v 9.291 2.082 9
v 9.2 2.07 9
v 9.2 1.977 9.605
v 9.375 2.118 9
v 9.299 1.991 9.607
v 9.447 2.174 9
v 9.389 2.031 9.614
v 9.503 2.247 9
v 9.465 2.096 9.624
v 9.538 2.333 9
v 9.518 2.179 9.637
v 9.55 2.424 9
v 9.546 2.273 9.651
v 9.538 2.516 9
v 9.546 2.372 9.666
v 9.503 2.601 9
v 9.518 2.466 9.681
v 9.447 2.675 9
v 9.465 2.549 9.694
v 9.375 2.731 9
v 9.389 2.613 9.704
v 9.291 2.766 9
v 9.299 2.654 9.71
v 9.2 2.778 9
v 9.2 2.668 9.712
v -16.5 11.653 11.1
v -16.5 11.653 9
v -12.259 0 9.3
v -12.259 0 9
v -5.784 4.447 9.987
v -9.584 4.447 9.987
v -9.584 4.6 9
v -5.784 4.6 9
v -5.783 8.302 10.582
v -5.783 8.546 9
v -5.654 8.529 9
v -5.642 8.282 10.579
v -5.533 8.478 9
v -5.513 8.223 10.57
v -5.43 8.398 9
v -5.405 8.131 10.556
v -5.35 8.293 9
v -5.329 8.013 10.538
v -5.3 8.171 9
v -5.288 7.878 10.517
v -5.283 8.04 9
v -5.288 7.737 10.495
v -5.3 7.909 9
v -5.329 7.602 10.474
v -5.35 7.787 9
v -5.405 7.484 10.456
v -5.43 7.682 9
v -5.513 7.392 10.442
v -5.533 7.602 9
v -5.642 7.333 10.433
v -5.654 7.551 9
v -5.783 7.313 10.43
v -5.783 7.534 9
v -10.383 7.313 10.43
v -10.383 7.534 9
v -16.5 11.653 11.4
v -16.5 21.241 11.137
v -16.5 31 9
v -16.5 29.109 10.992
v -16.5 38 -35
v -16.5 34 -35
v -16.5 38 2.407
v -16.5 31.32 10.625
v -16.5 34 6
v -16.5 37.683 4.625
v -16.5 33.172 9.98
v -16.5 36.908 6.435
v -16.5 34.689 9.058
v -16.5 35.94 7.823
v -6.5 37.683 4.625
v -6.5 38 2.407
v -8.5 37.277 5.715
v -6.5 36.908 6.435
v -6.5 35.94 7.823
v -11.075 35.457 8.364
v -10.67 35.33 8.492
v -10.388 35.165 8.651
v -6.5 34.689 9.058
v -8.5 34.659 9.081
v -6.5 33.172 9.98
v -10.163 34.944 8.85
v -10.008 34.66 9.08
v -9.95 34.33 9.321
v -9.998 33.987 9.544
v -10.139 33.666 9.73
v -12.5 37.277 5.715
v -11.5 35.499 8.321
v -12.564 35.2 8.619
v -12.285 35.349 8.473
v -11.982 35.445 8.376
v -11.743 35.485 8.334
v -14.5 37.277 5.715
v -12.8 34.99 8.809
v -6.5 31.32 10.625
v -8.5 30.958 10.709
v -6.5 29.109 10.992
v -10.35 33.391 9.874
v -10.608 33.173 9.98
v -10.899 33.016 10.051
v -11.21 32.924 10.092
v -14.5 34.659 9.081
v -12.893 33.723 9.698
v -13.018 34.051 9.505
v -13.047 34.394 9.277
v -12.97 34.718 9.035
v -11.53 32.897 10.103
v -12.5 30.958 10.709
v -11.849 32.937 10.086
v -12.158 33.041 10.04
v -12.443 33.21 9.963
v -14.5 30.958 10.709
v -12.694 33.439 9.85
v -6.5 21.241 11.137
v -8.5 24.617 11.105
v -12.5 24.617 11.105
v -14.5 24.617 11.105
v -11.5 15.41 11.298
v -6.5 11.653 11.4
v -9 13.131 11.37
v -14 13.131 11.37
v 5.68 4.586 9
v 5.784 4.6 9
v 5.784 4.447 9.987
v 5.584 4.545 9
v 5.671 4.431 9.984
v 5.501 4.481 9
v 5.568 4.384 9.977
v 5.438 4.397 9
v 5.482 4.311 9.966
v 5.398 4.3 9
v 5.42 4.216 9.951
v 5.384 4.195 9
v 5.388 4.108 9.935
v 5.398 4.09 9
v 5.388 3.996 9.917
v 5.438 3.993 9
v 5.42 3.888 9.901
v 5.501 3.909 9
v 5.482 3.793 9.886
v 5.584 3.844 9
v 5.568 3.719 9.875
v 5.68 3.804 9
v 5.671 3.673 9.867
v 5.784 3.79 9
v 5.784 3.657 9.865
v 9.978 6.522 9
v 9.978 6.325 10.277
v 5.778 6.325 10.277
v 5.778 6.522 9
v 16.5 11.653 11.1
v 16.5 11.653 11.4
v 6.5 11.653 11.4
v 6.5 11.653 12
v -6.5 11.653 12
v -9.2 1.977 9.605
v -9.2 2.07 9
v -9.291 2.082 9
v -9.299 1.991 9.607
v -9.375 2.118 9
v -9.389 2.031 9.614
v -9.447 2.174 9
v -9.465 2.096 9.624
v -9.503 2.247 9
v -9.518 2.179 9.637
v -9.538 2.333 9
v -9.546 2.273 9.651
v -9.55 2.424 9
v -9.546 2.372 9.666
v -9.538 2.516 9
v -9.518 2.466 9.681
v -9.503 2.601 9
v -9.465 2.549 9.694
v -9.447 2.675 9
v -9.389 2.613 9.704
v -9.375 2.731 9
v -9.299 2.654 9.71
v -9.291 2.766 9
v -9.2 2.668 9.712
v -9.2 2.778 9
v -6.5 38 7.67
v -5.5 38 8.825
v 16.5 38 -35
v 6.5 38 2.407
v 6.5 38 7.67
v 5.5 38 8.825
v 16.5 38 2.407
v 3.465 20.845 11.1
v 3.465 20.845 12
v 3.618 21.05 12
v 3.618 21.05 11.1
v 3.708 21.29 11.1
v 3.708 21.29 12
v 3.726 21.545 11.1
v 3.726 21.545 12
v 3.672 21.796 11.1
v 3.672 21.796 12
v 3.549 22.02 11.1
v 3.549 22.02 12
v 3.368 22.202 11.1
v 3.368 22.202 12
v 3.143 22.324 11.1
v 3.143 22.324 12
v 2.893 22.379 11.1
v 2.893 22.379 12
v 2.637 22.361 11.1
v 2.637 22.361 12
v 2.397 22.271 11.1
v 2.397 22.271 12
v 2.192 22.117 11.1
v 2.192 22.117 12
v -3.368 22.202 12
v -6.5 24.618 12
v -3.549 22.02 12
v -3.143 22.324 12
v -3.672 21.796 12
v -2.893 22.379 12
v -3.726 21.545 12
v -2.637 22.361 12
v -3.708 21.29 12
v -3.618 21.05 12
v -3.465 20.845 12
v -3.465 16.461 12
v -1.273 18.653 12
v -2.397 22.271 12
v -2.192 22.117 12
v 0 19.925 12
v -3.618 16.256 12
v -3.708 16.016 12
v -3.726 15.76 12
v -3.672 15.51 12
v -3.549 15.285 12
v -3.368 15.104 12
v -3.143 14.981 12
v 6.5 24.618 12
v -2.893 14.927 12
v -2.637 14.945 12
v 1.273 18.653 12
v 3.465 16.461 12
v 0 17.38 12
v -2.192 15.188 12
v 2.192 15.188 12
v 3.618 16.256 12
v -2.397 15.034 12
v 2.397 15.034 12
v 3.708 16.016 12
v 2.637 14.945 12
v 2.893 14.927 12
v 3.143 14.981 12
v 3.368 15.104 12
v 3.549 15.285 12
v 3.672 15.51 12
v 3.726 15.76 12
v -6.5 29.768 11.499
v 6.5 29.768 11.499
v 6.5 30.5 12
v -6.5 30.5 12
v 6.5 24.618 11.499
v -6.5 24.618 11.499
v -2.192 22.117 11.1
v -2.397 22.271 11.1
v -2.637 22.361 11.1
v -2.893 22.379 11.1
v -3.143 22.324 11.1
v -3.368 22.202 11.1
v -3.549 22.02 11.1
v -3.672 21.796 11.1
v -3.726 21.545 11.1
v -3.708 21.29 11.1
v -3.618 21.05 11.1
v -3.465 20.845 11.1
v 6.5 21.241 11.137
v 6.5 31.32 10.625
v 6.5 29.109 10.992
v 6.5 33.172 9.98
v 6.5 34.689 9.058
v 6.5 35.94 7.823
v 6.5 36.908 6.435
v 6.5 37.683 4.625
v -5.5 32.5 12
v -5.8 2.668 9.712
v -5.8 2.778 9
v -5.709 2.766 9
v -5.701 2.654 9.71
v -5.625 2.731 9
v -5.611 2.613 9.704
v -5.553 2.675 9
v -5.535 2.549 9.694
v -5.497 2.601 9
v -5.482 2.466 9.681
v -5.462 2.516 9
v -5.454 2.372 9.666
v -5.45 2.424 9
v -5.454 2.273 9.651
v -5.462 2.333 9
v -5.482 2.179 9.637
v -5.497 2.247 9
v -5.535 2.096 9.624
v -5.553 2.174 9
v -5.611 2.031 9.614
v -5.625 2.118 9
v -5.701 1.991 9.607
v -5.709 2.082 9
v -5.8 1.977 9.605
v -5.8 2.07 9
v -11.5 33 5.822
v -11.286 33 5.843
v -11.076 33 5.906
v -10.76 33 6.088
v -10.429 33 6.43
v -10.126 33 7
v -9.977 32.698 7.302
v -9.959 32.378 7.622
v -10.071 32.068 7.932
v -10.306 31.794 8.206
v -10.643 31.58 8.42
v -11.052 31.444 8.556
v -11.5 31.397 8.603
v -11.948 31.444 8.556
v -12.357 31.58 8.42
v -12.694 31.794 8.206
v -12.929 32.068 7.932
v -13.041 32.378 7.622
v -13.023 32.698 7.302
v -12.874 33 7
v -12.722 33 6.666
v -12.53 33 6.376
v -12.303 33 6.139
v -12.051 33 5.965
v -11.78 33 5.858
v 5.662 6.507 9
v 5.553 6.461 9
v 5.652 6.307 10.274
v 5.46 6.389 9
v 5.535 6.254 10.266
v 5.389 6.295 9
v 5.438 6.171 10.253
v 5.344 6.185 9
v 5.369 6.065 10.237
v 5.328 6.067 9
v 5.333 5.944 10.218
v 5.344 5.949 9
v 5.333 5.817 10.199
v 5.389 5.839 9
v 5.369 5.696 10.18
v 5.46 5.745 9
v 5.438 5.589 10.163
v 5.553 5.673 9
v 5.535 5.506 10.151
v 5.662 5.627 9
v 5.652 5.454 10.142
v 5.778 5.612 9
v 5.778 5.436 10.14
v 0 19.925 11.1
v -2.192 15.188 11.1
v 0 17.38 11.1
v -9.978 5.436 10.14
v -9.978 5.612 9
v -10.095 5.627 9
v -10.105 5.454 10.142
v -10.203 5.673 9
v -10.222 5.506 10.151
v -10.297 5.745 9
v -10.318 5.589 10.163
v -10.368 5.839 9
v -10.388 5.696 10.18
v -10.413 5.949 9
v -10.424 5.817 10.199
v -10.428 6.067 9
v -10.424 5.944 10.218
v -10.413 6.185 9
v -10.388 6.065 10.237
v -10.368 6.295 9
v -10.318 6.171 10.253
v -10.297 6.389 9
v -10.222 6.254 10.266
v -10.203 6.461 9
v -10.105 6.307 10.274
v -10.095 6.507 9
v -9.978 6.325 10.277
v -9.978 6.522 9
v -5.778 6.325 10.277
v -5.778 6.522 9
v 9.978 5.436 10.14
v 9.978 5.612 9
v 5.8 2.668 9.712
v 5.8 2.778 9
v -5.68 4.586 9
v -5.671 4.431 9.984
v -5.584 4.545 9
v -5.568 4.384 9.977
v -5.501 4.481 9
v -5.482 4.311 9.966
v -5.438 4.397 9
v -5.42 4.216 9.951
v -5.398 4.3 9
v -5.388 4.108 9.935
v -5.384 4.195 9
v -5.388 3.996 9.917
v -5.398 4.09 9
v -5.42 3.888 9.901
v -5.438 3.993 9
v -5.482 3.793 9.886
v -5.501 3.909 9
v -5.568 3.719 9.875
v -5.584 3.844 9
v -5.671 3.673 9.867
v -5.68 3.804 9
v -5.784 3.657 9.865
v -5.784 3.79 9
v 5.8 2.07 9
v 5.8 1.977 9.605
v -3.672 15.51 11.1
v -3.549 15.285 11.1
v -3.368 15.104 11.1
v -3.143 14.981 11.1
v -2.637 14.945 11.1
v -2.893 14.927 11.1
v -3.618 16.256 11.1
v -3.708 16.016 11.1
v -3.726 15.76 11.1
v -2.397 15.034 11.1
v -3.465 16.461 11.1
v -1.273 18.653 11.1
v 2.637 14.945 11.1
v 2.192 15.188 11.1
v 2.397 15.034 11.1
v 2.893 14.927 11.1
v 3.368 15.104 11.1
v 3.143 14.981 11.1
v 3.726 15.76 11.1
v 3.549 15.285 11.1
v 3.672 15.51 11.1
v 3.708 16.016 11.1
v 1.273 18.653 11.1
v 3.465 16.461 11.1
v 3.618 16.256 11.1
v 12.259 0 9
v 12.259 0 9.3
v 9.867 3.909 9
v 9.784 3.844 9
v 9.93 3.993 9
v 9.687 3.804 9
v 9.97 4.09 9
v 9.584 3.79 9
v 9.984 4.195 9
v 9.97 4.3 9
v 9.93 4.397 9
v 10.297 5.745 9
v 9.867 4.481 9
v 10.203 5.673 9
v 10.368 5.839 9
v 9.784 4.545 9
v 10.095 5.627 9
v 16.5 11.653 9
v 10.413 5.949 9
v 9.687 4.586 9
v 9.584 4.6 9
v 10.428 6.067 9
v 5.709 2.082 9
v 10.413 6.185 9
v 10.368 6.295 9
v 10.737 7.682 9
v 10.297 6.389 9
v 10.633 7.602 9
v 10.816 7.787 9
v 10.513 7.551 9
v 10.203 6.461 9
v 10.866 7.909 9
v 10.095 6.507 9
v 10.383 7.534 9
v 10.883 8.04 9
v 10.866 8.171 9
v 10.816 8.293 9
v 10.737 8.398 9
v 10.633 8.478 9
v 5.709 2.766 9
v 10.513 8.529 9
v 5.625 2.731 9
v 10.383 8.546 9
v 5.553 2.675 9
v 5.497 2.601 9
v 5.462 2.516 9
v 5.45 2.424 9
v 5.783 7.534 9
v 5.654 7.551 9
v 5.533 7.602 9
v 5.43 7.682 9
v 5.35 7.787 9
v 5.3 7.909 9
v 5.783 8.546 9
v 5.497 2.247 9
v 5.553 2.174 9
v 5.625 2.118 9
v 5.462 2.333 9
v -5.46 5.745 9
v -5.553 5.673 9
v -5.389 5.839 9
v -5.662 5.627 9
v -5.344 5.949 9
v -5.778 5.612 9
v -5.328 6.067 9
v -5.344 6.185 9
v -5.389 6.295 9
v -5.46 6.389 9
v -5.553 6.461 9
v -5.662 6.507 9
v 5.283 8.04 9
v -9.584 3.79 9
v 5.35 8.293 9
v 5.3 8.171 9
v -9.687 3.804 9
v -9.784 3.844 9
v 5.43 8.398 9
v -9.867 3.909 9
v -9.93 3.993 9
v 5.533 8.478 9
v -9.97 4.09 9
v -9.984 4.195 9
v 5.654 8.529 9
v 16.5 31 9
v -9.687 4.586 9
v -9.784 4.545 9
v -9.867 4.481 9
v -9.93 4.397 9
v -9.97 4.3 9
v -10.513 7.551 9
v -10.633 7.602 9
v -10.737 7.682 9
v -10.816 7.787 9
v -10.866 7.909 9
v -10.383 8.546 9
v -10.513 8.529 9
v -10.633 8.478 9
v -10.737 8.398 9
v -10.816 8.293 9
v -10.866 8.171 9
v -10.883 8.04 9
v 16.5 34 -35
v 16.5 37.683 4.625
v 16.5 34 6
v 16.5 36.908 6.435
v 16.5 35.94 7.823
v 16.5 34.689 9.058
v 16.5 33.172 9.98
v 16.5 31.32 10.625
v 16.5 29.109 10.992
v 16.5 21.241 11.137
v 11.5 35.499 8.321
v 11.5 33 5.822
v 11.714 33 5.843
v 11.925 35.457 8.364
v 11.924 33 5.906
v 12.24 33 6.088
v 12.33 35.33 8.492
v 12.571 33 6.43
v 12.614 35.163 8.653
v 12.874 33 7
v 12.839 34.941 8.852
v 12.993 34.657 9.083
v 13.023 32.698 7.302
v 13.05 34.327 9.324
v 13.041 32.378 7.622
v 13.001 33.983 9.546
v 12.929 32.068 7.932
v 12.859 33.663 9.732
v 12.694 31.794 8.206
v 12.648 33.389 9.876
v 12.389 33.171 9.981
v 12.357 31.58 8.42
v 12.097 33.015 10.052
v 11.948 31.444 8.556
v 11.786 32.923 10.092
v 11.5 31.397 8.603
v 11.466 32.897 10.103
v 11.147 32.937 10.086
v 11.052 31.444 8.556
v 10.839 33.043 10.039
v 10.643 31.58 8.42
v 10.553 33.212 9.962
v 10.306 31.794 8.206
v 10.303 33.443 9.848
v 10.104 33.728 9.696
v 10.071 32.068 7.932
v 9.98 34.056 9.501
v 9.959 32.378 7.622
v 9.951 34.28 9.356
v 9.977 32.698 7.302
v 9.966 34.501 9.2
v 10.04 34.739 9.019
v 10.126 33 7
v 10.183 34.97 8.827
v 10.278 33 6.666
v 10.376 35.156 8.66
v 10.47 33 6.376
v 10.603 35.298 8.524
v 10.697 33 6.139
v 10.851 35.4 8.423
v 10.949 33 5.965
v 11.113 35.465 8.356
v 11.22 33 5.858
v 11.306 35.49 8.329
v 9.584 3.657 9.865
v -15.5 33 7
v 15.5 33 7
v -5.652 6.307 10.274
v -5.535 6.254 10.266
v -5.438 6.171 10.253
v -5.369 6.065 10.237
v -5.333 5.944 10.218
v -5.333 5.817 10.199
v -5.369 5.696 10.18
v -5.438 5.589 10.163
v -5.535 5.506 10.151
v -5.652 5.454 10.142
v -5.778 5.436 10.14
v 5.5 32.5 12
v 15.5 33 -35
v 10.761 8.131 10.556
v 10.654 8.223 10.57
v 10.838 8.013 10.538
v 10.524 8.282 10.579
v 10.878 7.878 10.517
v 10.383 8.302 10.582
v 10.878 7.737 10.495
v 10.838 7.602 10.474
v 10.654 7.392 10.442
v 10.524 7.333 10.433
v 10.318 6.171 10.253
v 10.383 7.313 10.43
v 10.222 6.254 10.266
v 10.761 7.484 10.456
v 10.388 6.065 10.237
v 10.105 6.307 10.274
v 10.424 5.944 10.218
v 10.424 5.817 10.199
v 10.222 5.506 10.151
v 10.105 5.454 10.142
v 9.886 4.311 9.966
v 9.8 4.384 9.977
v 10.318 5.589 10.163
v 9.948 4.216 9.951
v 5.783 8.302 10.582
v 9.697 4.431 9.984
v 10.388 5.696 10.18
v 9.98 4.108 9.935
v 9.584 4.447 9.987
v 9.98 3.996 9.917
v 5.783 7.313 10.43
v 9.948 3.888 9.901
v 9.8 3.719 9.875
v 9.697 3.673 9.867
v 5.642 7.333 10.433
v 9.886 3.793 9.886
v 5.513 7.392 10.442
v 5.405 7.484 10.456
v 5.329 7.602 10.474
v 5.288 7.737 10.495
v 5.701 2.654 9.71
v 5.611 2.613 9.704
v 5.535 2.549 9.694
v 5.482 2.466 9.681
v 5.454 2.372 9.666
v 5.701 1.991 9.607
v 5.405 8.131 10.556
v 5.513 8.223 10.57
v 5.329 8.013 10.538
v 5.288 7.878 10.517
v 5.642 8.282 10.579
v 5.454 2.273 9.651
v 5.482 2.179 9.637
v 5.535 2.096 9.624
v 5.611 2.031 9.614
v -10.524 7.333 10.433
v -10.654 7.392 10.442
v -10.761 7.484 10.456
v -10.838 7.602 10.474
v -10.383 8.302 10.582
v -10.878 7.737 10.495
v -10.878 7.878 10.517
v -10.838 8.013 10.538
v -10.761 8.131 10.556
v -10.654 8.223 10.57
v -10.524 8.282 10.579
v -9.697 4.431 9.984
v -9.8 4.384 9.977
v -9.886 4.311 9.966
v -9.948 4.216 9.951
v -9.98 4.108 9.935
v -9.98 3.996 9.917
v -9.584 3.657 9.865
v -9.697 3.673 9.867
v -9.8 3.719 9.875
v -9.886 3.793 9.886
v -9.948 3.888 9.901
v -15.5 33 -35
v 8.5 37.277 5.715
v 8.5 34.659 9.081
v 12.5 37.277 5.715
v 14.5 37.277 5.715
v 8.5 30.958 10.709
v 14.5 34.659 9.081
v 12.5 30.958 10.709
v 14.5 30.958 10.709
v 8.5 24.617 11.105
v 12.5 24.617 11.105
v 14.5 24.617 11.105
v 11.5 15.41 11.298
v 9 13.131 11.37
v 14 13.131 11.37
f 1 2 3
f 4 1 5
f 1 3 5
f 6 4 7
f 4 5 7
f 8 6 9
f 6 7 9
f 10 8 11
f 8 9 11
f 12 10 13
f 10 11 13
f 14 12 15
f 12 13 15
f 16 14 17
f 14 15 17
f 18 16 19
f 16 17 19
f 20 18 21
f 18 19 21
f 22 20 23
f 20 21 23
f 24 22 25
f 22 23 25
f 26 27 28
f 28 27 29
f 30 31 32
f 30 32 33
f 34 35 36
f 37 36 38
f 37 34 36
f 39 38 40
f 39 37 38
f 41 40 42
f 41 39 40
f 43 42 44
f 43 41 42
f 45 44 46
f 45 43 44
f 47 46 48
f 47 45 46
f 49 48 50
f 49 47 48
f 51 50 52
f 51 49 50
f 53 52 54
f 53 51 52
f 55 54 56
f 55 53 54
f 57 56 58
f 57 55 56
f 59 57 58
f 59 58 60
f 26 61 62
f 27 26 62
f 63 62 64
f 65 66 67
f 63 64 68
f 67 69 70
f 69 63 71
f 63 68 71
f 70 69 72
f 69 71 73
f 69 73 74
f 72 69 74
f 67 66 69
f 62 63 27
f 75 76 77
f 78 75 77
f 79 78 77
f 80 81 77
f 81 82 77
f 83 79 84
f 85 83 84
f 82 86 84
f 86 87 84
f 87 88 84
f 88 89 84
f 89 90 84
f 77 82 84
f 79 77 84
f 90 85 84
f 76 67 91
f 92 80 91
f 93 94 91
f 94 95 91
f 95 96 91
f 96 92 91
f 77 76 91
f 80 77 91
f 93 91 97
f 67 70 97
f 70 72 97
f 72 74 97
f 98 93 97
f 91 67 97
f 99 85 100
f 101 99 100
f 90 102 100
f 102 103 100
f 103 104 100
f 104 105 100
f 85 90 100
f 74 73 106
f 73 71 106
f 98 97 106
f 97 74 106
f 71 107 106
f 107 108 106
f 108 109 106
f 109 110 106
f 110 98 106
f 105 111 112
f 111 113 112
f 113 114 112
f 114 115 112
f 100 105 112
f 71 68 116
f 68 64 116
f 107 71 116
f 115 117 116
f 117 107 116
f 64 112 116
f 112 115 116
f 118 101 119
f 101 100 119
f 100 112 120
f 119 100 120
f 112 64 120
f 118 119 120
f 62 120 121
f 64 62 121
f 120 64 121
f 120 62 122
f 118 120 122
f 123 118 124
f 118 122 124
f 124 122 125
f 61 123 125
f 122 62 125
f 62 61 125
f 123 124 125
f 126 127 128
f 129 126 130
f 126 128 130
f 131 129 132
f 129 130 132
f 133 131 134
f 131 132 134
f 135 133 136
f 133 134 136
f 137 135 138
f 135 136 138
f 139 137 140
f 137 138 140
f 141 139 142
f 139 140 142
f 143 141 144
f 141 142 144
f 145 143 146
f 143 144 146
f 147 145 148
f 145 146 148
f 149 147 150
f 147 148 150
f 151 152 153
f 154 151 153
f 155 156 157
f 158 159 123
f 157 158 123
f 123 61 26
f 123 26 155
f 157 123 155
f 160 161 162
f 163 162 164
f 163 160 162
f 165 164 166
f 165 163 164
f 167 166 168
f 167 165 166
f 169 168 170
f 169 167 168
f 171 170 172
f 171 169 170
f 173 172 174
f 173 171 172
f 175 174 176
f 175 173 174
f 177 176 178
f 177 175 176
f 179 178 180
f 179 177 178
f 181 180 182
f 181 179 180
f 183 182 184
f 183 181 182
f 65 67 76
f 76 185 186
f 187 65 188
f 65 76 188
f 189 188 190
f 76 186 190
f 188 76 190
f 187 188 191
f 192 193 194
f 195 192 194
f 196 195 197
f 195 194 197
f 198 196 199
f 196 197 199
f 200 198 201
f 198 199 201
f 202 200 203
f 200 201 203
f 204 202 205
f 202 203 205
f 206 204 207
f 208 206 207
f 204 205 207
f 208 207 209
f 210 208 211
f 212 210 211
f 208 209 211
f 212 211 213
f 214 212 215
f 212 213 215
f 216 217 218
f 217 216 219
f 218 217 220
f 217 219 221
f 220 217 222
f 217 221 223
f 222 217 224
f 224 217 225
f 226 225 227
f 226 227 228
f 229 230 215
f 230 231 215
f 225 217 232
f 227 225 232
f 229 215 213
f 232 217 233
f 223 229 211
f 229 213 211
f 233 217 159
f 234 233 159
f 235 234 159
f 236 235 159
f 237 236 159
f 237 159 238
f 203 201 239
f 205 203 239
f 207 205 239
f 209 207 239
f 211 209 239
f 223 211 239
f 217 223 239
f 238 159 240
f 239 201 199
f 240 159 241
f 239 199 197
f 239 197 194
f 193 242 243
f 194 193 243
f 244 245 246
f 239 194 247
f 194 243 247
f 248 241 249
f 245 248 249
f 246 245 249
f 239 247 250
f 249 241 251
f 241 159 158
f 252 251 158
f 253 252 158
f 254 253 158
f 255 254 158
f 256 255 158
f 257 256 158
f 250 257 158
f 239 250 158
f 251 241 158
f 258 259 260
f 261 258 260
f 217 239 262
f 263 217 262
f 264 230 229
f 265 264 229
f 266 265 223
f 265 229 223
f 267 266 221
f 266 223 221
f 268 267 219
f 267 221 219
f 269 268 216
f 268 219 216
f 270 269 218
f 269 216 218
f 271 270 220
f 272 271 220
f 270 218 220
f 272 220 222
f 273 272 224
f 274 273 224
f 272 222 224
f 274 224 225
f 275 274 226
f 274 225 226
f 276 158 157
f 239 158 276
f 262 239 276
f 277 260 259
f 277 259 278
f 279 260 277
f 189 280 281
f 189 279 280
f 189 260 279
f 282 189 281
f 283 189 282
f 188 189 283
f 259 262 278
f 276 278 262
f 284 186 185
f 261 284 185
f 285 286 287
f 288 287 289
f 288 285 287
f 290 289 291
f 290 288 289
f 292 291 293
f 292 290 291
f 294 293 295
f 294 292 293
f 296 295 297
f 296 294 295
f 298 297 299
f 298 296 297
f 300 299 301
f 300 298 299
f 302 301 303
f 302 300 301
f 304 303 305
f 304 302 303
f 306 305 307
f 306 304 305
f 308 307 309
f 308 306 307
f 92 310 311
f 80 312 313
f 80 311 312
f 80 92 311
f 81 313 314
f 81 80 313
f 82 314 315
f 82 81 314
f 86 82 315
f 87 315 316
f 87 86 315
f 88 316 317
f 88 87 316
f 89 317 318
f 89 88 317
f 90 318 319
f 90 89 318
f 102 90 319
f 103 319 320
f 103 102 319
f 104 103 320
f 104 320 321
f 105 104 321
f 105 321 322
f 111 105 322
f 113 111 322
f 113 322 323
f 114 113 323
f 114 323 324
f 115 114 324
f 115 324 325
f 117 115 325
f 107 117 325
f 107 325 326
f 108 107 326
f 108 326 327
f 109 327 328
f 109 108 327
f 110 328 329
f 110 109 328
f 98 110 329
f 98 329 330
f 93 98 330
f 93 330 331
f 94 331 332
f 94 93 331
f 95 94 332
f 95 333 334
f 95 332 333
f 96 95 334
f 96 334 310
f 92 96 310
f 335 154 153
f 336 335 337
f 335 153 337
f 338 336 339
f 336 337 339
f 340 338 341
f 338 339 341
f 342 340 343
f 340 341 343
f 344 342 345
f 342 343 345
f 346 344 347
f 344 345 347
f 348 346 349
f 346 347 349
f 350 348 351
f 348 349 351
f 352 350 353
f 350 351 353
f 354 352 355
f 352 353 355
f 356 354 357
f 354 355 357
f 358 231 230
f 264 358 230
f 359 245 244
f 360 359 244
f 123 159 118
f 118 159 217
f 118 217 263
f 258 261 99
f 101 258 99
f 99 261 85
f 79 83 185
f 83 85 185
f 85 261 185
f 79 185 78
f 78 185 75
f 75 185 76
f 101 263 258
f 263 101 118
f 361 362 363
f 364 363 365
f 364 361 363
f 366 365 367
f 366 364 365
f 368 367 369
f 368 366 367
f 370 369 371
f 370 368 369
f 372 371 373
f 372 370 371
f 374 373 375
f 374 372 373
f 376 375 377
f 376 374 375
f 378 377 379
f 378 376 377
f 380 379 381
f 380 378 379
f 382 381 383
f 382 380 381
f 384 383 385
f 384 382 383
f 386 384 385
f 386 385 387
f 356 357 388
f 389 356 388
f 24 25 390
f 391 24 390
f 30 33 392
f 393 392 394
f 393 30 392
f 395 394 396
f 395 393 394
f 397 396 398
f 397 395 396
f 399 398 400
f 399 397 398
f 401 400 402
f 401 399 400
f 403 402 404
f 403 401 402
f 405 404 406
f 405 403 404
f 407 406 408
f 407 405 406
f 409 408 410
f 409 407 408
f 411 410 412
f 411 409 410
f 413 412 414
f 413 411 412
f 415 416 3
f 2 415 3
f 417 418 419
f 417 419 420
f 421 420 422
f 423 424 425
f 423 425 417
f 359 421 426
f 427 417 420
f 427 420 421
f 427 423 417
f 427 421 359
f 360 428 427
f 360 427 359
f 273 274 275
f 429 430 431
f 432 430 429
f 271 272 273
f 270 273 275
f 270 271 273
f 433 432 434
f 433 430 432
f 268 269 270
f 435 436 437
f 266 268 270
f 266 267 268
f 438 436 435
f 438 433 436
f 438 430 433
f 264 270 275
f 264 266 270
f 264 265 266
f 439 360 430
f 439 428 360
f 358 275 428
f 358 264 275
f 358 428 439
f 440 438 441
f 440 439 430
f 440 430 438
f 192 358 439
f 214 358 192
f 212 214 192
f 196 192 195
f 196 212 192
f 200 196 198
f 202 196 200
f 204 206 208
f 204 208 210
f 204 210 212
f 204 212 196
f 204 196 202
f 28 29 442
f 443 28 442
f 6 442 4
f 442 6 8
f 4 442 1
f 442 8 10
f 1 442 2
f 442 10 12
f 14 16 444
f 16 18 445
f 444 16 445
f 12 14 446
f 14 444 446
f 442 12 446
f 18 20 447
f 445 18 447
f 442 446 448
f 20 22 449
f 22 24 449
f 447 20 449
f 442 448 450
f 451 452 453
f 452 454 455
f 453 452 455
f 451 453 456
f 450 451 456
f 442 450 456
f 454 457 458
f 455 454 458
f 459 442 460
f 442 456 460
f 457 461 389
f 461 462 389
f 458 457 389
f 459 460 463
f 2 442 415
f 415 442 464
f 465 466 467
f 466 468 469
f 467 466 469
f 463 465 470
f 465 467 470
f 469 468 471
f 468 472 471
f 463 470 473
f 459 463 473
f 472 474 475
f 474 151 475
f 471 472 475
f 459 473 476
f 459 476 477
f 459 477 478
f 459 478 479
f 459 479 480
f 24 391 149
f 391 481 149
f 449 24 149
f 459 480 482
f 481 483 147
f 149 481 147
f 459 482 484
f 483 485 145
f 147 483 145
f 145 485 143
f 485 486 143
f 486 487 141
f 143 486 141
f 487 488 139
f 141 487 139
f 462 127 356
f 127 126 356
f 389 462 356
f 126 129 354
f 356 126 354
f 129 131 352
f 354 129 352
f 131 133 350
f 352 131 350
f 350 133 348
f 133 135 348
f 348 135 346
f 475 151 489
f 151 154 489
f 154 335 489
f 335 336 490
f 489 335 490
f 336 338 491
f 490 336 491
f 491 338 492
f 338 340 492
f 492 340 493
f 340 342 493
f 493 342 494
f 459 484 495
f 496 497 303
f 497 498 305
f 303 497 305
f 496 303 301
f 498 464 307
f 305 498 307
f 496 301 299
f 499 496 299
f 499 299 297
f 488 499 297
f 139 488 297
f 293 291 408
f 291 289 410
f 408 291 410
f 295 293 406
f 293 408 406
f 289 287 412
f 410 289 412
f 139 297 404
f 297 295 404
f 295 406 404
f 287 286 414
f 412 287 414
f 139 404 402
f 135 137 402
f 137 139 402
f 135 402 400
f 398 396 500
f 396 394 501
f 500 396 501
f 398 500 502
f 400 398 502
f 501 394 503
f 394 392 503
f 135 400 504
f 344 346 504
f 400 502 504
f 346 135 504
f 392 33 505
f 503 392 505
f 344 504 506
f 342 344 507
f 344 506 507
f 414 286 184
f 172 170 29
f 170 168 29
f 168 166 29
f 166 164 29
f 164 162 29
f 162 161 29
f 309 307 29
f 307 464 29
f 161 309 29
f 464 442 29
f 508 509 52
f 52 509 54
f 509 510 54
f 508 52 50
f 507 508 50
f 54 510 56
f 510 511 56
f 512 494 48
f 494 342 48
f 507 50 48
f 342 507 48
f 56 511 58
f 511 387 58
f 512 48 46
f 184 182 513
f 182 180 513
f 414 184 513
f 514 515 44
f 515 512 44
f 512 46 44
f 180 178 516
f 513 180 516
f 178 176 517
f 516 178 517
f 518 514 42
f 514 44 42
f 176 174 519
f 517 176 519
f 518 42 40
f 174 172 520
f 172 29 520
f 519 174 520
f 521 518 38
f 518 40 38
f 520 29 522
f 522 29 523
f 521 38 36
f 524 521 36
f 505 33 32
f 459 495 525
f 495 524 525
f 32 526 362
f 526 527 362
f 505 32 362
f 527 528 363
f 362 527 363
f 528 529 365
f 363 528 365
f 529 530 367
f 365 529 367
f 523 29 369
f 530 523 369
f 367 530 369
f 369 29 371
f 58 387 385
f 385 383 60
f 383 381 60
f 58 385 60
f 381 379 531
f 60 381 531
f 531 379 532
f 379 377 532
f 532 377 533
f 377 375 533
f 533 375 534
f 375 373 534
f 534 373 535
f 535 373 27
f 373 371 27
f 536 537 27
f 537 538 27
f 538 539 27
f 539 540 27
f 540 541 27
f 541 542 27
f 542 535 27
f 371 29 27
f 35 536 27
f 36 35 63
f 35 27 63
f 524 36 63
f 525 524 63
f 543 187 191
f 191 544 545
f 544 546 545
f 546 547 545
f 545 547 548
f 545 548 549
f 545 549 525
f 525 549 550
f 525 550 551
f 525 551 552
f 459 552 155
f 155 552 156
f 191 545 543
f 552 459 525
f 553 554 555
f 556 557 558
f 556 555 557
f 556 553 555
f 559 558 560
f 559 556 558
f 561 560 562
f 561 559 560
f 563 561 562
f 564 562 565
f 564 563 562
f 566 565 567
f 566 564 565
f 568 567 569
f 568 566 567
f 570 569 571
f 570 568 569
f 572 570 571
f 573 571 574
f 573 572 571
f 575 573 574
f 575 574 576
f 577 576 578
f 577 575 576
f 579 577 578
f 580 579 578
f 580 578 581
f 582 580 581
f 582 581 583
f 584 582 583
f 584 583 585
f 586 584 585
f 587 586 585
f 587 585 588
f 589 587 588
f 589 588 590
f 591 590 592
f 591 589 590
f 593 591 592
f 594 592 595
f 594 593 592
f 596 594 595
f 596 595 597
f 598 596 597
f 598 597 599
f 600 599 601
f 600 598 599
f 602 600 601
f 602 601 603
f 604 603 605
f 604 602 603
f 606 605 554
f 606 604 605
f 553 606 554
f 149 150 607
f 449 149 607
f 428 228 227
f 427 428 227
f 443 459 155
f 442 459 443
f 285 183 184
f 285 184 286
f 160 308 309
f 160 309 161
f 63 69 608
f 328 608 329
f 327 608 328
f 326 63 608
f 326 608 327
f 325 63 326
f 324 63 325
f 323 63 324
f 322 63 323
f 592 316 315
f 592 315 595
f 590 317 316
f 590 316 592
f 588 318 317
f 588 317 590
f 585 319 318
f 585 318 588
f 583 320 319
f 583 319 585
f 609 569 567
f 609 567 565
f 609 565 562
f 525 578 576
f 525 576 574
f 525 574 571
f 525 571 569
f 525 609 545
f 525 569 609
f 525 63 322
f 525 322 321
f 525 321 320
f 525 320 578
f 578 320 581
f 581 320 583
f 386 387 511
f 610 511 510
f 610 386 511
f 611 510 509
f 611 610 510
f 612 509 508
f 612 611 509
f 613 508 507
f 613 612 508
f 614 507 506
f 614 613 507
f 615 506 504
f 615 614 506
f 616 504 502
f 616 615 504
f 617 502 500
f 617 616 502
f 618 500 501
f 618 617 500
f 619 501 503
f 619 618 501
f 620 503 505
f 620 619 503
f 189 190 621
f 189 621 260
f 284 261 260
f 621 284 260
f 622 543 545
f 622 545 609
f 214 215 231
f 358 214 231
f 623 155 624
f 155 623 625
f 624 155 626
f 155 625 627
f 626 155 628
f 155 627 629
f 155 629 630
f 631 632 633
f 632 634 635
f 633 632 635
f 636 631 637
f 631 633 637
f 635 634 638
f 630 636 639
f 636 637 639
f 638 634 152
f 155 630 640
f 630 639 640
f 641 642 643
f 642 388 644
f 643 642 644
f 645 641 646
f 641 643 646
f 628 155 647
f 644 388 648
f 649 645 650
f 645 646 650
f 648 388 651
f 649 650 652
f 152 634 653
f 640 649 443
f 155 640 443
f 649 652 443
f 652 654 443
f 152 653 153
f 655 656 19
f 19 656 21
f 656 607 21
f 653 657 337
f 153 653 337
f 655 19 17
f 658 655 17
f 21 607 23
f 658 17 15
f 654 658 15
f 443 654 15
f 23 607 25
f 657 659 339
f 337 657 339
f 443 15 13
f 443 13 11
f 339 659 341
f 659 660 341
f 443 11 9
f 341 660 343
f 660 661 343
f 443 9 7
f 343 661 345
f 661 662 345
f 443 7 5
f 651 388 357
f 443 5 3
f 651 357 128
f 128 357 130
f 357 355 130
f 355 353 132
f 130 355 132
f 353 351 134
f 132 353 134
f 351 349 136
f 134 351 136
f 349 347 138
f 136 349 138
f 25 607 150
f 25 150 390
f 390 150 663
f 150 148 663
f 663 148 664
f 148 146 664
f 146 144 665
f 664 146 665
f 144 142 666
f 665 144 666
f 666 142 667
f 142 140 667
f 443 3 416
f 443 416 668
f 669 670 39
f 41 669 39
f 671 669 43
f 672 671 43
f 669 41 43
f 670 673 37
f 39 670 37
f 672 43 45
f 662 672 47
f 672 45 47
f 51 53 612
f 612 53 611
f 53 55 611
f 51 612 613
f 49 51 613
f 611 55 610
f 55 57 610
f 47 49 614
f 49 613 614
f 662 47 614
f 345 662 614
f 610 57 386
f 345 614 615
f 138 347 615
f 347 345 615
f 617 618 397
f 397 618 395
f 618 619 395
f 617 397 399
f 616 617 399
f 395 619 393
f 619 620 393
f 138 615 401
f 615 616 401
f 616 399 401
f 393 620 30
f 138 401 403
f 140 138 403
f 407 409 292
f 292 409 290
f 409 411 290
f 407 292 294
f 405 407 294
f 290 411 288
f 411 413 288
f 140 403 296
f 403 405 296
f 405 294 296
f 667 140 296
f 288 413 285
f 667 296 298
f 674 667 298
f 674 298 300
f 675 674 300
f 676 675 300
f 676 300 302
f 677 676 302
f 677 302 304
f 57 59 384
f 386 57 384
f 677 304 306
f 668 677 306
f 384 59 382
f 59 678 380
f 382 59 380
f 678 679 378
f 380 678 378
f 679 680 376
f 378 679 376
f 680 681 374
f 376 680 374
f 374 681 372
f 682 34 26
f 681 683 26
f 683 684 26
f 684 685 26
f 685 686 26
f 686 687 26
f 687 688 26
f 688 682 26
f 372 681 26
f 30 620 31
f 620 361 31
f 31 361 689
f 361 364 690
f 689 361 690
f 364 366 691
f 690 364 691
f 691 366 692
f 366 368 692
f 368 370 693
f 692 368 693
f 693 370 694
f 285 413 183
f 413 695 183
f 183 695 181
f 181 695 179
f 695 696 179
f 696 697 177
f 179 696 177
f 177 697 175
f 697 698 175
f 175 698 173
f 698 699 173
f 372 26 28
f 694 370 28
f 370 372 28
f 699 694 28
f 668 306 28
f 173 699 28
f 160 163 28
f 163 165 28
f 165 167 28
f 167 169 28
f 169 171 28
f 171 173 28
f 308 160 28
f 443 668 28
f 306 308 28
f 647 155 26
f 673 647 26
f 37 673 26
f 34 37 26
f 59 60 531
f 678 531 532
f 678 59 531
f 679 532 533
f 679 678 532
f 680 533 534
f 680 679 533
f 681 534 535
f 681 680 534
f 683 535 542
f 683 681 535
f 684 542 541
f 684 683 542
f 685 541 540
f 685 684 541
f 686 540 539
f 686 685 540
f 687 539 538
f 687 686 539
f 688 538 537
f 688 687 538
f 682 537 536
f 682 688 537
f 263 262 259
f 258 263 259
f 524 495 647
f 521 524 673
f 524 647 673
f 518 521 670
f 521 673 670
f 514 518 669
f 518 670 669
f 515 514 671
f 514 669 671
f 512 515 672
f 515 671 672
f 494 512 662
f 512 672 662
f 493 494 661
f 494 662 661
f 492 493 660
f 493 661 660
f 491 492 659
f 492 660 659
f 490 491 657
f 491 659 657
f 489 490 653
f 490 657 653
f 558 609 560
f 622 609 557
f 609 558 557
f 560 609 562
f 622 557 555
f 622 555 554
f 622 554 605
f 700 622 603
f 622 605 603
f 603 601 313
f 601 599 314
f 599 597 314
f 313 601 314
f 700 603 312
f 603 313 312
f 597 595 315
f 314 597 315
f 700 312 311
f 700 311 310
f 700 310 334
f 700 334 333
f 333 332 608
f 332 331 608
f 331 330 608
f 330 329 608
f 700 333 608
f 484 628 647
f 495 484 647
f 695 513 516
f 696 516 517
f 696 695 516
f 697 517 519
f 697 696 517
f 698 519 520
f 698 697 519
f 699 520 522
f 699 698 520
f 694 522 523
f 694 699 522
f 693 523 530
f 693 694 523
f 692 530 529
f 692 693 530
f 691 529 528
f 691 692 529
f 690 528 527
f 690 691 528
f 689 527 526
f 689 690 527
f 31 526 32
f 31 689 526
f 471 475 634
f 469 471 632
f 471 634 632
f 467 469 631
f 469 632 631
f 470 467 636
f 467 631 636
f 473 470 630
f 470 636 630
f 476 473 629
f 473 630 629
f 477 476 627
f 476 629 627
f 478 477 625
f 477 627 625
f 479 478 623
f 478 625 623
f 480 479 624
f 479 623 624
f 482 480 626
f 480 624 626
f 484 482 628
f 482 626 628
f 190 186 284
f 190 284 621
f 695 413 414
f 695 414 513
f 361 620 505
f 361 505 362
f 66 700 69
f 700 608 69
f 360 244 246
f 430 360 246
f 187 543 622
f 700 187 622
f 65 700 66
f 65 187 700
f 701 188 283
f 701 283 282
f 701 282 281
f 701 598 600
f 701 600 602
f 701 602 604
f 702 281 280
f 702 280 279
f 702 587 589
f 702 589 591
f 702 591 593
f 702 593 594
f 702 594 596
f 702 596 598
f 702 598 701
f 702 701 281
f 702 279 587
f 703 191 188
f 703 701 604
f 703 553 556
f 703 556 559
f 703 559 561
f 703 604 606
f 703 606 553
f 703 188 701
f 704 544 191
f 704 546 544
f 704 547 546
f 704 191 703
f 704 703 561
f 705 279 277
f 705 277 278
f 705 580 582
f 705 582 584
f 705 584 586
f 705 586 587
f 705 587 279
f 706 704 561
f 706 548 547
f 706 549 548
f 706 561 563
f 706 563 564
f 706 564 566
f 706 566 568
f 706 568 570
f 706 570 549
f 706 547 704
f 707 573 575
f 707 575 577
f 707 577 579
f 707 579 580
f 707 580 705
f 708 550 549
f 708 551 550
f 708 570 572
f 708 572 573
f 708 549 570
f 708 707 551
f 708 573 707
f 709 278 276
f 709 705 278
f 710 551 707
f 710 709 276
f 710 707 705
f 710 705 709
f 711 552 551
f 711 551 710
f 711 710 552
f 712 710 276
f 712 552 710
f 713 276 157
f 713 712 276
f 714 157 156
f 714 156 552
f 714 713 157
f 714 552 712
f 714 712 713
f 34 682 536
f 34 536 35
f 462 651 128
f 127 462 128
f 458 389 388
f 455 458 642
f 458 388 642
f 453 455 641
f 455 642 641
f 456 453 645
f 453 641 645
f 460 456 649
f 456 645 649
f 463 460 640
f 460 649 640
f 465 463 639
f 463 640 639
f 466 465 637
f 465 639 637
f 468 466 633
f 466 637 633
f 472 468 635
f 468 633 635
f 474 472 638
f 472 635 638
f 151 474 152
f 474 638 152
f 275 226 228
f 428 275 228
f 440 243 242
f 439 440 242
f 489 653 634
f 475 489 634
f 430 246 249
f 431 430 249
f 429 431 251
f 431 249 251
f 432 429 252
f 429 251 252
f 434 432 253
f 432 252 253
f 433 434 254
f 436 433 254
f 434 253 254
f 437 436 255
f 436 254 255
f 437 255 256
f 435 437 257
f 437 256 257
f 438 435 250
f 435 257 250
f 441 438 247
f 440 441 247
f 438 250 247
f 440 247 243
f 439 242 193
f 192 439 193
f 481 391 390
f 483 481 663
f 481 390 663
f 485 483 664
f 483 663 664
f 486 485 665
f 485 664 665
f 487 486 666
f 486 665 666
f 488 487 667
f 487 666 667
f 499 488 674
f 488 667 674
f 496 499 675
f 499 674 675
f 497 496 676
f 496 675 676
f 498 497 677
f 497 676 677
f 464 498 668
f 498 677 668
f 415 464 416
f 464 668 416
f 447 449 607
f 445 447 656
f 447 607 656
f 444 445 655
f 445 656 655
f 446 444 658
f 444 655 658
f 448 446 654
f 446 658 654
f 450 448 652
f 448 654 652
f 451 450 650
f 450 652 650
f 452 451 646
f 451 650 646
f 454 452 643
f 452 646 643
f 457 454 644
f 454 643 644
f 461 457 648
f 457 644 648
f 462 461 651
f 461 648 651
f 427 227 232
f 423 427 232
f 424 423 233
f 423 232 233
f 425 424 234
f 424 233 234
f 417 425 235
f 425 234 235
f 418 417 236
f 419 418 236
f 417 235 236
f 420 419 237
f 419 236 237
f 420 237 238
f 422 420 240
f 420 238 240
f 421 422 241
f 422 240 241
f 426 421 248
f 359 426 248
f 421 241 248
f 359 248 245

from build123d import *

# Parameters (mm, degrees)
SKETCH_1_W                = 33
SKETCH_1_H                = 24
EXTRUDE_1_DEPTH           = 38
SKETCH_2_W                = 21
SKETCH_2_H                = 33
CUT_EXTRUDE_1_DEPTH       = 35
CHAMFER_1_SIZE            = 5.5
CHAMFER_1_SIZE2           = 3.175426481
CHAMFER_2_SIZE            = 2
CHAMFER_3_SIZE            = 1
CUT_EXTRUDE_2_DEPTH       = 35
CUT_EXTRUDE_3_DEPTH       = 10
CUT_EXTRUDE_4_DEPTH       = 47.446205605
EXTRUDE_4_DEPTH           = 23
CHAMFER_4_SIZE            = 1
CUT_EXTRUDE_5_DEPTH       = 62.385572206
CUT_EXTRUDE_6_DEPTH       = 0.9
CUT_EXTRUDE_10_DEPTH      = 57.550862232
CUT_EXTRUDE_11_DEPTH      = 61.805016358
CUT_EXTRUDE_11_DEPTH_BACK = 61.805016358
SKETCH_11_R               = 1.55


with BuildPart() as part:
    # 草图1 → 凸台-拉伸1 (new body)
    with BuildSketch(Plane(origin=(0, 0, 0), x_dir=(1, 0, 0), z_dir=(0, 1, 0))):
        Rectangle(SKETCH_1_W, SKETCH_1_H)
    extrude(amount=EXTRUDE_1_DEPTH)

    # 草图2 → 切除-拉伸1 (cut)
    with BuildSketch(Plane.ZY.offset(16.5)):
        with Locations((-1.5, 16.5)):
            Rectangle(SKETCH_2_W, SKETCH_2_H)
    extrude(amount=-CUT_EXTRUDE_1_DEPTH, mode=Mode.SUBTRACT)

    # 倒角1
    chamfer_1_edges = [part.edges().sort_by_distance(p)[0] for p in [
        (0, 38, 12),
    ]]
    chamfer_1_side = [part.faces().sort_by_distance(p)[0] for p in [
        (0, 19, 12),
    ]]
    chamfer(chamfer_1_edges, length=CHAMFER_1_SIZE, length2=CHAMFER_1_SIZE2, reference=chamfer_1_side[0])

    # 倒角2
    chamfer_2_edges = [part.edges().sort_by_distance(p)[0] for p in [
        (0, 33, 9),
    ]]
    chamfer(chamfer_2_edges, length=CHAMFER_2_SIZE)

    # 倒角3
    chamfer_3_edges = [part.edges().sort_by_distance(p)[0] for p in [
        (-16.5, 33, -2.5),
        (16.5, 33, -2.5),
    ]]
    chamfer(chamfer_3_edges, length=CHAMFER_3_SIZE)

    # 草图3 → 切除-拉伸2 (cut)
    with BuildSketch(Plane.ZY.offset(16.5)):
        Polygon((12, 11.65264418), (11.1, 11.65264418), (9.3, 0), (12, 0), align=None)
    extrude(amount=-CUT_EXTRUDE_2_DEPTH, mode=Mode.SUBTRACT)

    # 草图4 → 切除-拉伸3 (cut)
    with BuildSketch(Plane.ZY.offset(16.5)):
        with BuildLine():
            Line((2.407420419, 38), (8.824573519, 38))
            Line((8.824573519, 38), (12, 32.5))
            Line((12, 32.5), (12, 11.65264418))
            Line((12, 11.65264418), (11.4, 11.65264418))
            add(Edge.make_bspline(
                [(2.407420419, 38), (4.944551671, 38), (7.556679946, 36.344258823), (10.730064424, 32.982057859), (11.149753025, 28.468325596), (11.041432106, 20.888283621), (11.4, 13.338591536), (11.4, 11.65264418)],
                knots=[0, 0, 0, 0, 0.112889984, 0.156477463, 0.404830641, 0.492287309, 1, 1, 1, 1], degree=3))
        make_face()
    cut_extrude_3 = extrude(amount=-CUT_EXTRUDE_3_DEPTH, mode=Mode.SUBTRACT)

    # 镜向1: 切除-拉伸3 across plane
    add(cut_extrude_3.mirror(Plane(origin=(0, 0, 0), x_dir=(0, 0, 1), z_dir=(1, 0, 0))), mode=Mode.SUBTRACT)

    # 草图6 → 切除-拉伸4 (cut, through all)
    with BuildSketch(Plane(origin=(0, 0, 9), x_dir=(-1, 0, 0), z_dir=(0, 0, -1))):
        Polygon((16.5, 11.65264418), (12.258784368, 0), (16.5, 0), align=None)
        Polygon((-12.258784368, 0), (-16.5, 0), (-16.5, 11.65264418), align=None)
    extrude(amount=-CUT_EXTRUDE_4_DEPTH, mode=Mode.SUBTRACT)

    # 草图8 → 凸台-拉伸4 (add)
    with BuildSketch(Plane(origin=(0, 0, -12), x_dir=(-1, 0, 0), z_dir=(0, 0, -1))):
        Polygon((-16.5, 38), (-16.5, 34), (-15.5, 33), (15.5, 33), (16.5, 34), (16.5, 38), align=None)
    extrude(amount=EXTRUDE_4_DEPTH)

    # 倒角4
    chamfer_4_edges = [part.edges().sort_by_distance(p)[0] for p in [
        (6.5, 35.25, 10.41228676),
        (-6.5, 35.25, 10.41228676),
    ]]
    chamfer(chamfer_4_edges, length=CHAMFER_4_SIZE)

    # 草图9 → 切除-拉伸5 (cut, through all)
    with BuildSketch(Plane(origin=(0, -1.403103783, 9.083260626), x_dir=(1, 0, 0), z_dir=(0, -0.15266076466219888, 0.9882786504487248))):
        with BuildLine():
            Line((-10.383328506, 9.819745111), (-5.783328506, 9.819745111))
            ThreePointArc((-5.783328506, 9.819745111), (-5.283328506, 9.319745111), (-5.783328506, 8.819745111))
            Line((-5.783328506, 8.819745111), (-10.383328506, 8.819745111))
            ThreePointArc((-10.383328506, 8.819745111), (-10.883328506, 9.319745111), (-10.383328506, 9.819745111))
        make_face()
        with BuildLine():
            Line((-9.978375247, 7.819745111), (-5.778375247, 7.819745111))
            ThreePointArc((-5.778375247, 7.819745111), (-5.328375247, 7.369745111), (-5.778375247, 6.919745111))
            Line((-5.778375247, 6.919745111), (-9.978375247, 6.919745111))
            ThreePointArc((-9.978375247, 6.919745111), (-10.428375247, 7.369745111), (-9.978375247, 7.819745111))
        make_face()
        with BuildLine():
            Line((-9.583932412, 5.919745111), (-5.783932412, 5.919745111))
            ThreePointArc((-5.783932412, 5.919745111), (-5.383932412, 5.519745111), (-5.783932412, 5.119745111))
            Line((-5.783932412, 5.119745111), (-9.583932412, 5.119745111))
            ThreePointArc((-9.583932412, 5.119745111), (-9.983932412, 5.519745111), (-9.583932412, 5.919745111))
        make_face()
        with BuildLine():
            Line((-9.2, 4.119745111), (-5.8, 4.119745111))
            ThreePointArc((-5.8, 4.119745111), (-5.45, 3.769745111), (-5.8, 3.419745111))
            Line((-5.8, 3.419745111), (-9.2, 3.419745111))
            ThreePointArc((-9.2, 3.419745111), (-9.55, 3.769745111), (-9.2, 4.119745111))
        make_face()
        with BuildLine():
            Line((9.2, 4.119745111), (5.8, 4.119745111))
            ThreePointArc((5.8, 4.119745111), (5.45, 3.769745111), (5.8, 3.419745111))
            Line((5.8, 3.419745111), (9.2, 3.419745111))
            ThreePointArc((9.2, 3.419745111), (9.55, 3.769745111), (9.2, 4.119745111))
        make_face()
        with BuildLine():
            Line((9.583932412, 5.919745111), (5.783932412, 5.919745111))
            ThreePointArc((5.783932412, 5.919745111), (5.383932412, 5.519745111), (5.783932412, 5.119745111))
            Line((5.783932412, 5.119745111), (9.583932412, 5.119745111))
            ThreePointArc((9.583932412, 5.119745111), (9.983932412, 5.519745111), (9.583932412, 5.919745111))
        make_face()
        with BuildLine():
            Line((9.978375247, 7.819745111), (5.778375247, 7.819745111))
            ThreePointArc((5.778375247, 7.819745111), (5.328375247, 7.369745111), (5.778375247, 6.919745111))
            Line((5.778375247, 6.919745111), (9.978375247, 6.919745111))
            ThreePointArc((9.978375247, 6.919745111), (10.428375247, 7.369745111), (9.978375247, 7.819745111))
        make_face()
        with BuildLine():
            Line((10.383328506, 9.819745111), (5.783328506, 9.819745111))
            ThreePointArc((5.783328506, 9.819745111), (5.283328506, 9.319745111), (5.783328506, 8.819745111))
            Line((5.783328506, 8.819745111), (10.383328506, 8.819745111))
            ThreePointArc((10.383328506, 8.819745111), (10.883328506, 9.319745111), (10.383328506, 9.819745111))
        make_face()
    extrude(amount=-CUT_EXTRUDE_5_DEPTH, mode=Mode.SUBTRACT)

    # 草图7 → 切除-拉伸6 (cut)
    with BuildSketch(Plane.XY.offset(12)):
        with BuildLine():
            Line((-3.464823228, 20.844675201), (-1.272792206, 18.65264418))
            Line((-1.272792206, 18.65264418), (0, 19.925436386))
            Line((0, 19.925436386), (-2.192031022, 22.117467408))
            ThreePointArc((-2.192031022, 22.117467408), (-3.464823228, 22.117467408), (-3.464823228, 20.844675201))
        make_face()
        with BuildLine():
            Line((2.192031022, 22.117467408), (0, 19.925436386))
            Line((0, 19.925436386), (1.272792206, 18.65264418))
            Line((1.272792206, 18.65264418), (3.464823228, 20.844675201))
            ThreePointArc((3.464823228, 20.844675201), (3.464823228, 22.117467408), (2.192031022, 22.117467408))
        make_face()
        Polygon((0, 19.925436386), (-1.272792206, 18.65264418), (0, 17.379851974), (1.272792206, 18.65264418), align=None)
        with BuildLine():
            Line((1.272792206, 18.65264418), (0, 17.379851974))
            Line((0, 17.379851974), (2.192031022, 15.187820952))
            ThreePointArc((2.192031022, 15.187820952), (3.464823228, 15.187820952), (3.464823228, 16.460613158))
            Line((3.464823228, 16.460613158), (1.272792206, 18.65264418))
        make_face()
        with BuildLine():
            Line((-1.272792206, 18.65264418), (-3.464823228, 16.460613158))
            ThreePointArc((-3.464823228, 16.460613158), (-3.464823228, 15.187820952), (-2.192031022, 15.187820952))
            Line((-2.192031022, 15.187820952), (0, 17.379851974))
            Line((0, 17.379851974), (-1.272792206, 18.65264418))
        make_face()
    extrude(amount=-CUT_EXTRUDE_6_DEPTH, mode=Mode.SUBTRACT)

    # 草图14 → 切除-拉伸10 (cut, through all)
    with BuildSketch(Plane(origin=(6.5, 0, 0), x_dir=(0, 0, -1), z_dir=(1, 0, 0))):
        Polygon((-12, 24.618124987), (-11.498636716, 24.618124987), (-11.498636716, 29.768492853), (-12, 30.5), align=None)
    extrude(amount=-CUT_EXTRUDE_10_DEPTH, mode=Mode.SUBTRACT)

    # 草图11 → 切除-拉伸11 (cut, two sides: drawn at the far end of the back side and taken through both)
    with BuildSketch(Plane(origin=(0, 20, 20), x_dir=(1, 0, 0), z_dir=(0, -0.7071067811865511, -0.707106781186544)).offset(-CUT_EXTRUDE_11_DEPTH_BACK)):
        with Locations(Location((-11.5, -17.667754382, 0), (0, 0, 270))):
            Circle(SKETCH_11_R)
        with Locations(Location((11.5, -17.667754382, 0), (0, 0, 270))):
            Circle(SKETCH_11_R)
    extrude(amount=CUT_EXTRUDE_11_DEPTH + CUT_EXTRUDE_11_DEPTH_BACK, mode=Mode.SUBTRACT)


solid = part.part
